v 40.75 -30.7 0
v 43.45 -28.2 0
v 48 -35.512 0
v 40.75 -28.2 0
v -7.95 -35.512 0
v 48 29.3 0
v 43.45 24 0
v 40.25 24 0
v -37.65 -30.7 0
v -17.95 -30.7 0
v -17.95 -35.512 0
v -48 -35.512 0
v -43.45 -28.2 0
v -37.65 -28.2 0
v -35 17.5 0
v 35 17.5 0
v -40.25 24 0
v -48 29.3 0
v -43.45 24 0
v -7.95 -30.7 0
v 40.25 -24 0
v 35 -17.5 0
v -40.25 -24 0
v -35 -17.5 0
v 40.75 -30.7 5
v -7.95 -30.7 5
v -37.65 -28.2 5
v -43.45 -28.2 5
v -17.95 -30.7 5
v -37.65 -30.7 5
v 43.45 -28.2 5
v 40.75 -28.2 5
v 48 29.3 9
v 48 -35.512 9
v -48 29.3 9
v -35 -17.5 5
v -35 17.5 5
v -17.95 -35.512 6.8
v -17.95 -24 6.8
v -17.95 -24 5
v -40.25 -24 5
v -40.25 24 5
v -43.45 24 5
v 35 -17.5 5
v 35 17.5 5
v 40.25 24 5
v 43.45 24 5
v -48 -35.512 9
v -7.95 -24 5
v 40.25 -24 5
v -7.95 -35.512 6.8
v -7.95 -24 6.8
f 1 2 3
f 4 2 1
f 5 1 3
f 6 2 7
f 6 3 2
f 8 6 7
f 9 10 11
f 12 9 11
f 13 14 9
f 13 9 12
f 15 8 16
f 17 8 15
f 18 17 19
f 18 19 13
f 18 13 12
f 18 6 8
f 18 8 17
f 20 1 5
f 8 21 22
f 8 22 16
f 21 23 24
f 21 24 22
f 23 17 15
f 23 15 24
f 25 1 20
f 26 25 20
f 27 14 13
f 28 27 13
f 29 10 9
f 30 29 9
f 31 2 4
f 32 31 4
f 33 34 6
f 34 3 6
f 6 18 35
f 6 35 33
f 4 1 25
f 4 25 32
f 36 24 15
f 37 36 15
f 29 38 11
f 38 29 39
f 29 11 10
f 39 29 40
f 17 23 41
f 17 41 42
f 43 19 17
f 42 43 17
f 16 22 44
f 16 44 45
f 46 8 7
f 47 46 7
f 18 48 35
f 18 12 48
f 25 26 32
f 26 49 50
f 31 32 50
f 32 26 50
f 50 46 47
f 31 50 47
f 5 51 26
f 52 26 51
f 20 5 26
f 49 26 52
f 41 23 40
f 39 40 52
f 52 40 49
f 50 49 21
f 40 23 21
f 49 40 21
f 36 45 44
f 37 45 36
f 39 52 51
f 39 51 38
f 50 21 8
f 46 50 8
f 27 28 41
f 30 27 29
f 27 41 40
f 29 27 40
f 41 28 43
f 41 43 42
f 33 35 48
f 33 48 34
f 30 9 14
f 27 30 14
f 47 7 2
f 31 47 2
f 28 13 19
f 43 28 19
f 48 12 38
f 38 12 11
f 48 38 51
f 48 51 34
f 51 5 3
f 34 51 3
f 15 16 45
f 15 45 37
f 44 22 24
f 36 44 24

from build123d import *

# Parameters (mm, degrees)
CROQUIS1_W              = 80.5
CROQUIS1_H              = 53.3
SALIENTE_EXTRUIR1_DEPTH = 5
CROQUIS2_W              = 96
CROQUIS2_H              = 64.811604732
SALIENTE_EXTRUIR2_DEPTH = 4
CROQUIS3_W              = 10
CROQUIS3_H              = 15
CORTAR_EXTRUIR1_DEPTH   = 6.8
CROQUIS4_W              = 5.8
CROQUIS4_H              = 2.5
CROQUIS4_W_2            = 2.7
SALIENTE_EXTRUIR3_DEPTH = 7
CROQUIS5_W              = 70
CROQUIS5_H              = 35
CORTAR_EXTRUIR2_DEPTH   = 5


with BuildPart() as part:
    # Croquis1 → Saliente-Extruir1 (new body)
    with BuildSketch(Plane.XY):
        Polygon((-43.45, 24), (-40.25, 24), (-40.25, 29.3), (-48, 29.3), (-48, -35.511604732), (48, -35.511604732), (48, 29.3), (40.25, 29.3), (40.25, 24), (43.45, 24), (43.45, -30.7), (-43.45, -30.7), align=None)
        with Locations((0, 2.65)):
            Rectangle(CROQUIS1_W, CROQUIS1_H)
    extrude(amount=SALIENTE_EXTRUIR1_DEPTH)

    # Croquis2 → Saliente-Extruir2 (add)
    with BuildSketch(Plane.XY.offset(5)):
        with Locations((0, -3.105802366)):
            Rectangle(CROQUIS2_W, CROQUIS2_H)
    extrude(amount=SALIENTE_EXTRUIR2_DEPTH)

    # Croquis3 → Cortar-Extruir1 (cut)
    with BuildSketch(Plane(origin=(0, 0, 0), x_dir=(-1, 0, 0), z_dir=(0, 0, -1))):
        with Locations((12.95, -31.5)):
            Rectangle(CROQUIS3_W, CROQUIS3_H)
    extrude(amount=-CORTAR_EXTRUIR1_DEPTH, mode=Mode.SUBTRACT)

    # Croquis4 → Saliente-Extruir3 (add)
    with BuildSketch(Plane(origin=(0, 0, 0), x_dir=(-1, 0, 0), z_dir=(0, 0, -1))):
        with Locations((40.55, -29.45)):
            Rectangle(CROQUIS4_W, CROQUIS4_H)
        with Locations((-42.1, -29.45)):
            Rectangle(CROQUIS4_W_2, CROQUIS4_H)
    extrude(amount=-SALIENTE_EXTRUIR3_DEPTH)

    # Croquis5 → Cortar-Extruir2 (cut)
    with BuildSketch(Plane(origin=(0, 0, 0), x_dir=(-1, 0, 0), z_dir=(0, 0, -1))):
        Rectangle(CROQUIS5_W, CROQUIS5_H)
    extrude(amount=-CORTAR_EXTRUIR2_DEPTH, mode=Mode.SUBTRACT)


solid = part.part
